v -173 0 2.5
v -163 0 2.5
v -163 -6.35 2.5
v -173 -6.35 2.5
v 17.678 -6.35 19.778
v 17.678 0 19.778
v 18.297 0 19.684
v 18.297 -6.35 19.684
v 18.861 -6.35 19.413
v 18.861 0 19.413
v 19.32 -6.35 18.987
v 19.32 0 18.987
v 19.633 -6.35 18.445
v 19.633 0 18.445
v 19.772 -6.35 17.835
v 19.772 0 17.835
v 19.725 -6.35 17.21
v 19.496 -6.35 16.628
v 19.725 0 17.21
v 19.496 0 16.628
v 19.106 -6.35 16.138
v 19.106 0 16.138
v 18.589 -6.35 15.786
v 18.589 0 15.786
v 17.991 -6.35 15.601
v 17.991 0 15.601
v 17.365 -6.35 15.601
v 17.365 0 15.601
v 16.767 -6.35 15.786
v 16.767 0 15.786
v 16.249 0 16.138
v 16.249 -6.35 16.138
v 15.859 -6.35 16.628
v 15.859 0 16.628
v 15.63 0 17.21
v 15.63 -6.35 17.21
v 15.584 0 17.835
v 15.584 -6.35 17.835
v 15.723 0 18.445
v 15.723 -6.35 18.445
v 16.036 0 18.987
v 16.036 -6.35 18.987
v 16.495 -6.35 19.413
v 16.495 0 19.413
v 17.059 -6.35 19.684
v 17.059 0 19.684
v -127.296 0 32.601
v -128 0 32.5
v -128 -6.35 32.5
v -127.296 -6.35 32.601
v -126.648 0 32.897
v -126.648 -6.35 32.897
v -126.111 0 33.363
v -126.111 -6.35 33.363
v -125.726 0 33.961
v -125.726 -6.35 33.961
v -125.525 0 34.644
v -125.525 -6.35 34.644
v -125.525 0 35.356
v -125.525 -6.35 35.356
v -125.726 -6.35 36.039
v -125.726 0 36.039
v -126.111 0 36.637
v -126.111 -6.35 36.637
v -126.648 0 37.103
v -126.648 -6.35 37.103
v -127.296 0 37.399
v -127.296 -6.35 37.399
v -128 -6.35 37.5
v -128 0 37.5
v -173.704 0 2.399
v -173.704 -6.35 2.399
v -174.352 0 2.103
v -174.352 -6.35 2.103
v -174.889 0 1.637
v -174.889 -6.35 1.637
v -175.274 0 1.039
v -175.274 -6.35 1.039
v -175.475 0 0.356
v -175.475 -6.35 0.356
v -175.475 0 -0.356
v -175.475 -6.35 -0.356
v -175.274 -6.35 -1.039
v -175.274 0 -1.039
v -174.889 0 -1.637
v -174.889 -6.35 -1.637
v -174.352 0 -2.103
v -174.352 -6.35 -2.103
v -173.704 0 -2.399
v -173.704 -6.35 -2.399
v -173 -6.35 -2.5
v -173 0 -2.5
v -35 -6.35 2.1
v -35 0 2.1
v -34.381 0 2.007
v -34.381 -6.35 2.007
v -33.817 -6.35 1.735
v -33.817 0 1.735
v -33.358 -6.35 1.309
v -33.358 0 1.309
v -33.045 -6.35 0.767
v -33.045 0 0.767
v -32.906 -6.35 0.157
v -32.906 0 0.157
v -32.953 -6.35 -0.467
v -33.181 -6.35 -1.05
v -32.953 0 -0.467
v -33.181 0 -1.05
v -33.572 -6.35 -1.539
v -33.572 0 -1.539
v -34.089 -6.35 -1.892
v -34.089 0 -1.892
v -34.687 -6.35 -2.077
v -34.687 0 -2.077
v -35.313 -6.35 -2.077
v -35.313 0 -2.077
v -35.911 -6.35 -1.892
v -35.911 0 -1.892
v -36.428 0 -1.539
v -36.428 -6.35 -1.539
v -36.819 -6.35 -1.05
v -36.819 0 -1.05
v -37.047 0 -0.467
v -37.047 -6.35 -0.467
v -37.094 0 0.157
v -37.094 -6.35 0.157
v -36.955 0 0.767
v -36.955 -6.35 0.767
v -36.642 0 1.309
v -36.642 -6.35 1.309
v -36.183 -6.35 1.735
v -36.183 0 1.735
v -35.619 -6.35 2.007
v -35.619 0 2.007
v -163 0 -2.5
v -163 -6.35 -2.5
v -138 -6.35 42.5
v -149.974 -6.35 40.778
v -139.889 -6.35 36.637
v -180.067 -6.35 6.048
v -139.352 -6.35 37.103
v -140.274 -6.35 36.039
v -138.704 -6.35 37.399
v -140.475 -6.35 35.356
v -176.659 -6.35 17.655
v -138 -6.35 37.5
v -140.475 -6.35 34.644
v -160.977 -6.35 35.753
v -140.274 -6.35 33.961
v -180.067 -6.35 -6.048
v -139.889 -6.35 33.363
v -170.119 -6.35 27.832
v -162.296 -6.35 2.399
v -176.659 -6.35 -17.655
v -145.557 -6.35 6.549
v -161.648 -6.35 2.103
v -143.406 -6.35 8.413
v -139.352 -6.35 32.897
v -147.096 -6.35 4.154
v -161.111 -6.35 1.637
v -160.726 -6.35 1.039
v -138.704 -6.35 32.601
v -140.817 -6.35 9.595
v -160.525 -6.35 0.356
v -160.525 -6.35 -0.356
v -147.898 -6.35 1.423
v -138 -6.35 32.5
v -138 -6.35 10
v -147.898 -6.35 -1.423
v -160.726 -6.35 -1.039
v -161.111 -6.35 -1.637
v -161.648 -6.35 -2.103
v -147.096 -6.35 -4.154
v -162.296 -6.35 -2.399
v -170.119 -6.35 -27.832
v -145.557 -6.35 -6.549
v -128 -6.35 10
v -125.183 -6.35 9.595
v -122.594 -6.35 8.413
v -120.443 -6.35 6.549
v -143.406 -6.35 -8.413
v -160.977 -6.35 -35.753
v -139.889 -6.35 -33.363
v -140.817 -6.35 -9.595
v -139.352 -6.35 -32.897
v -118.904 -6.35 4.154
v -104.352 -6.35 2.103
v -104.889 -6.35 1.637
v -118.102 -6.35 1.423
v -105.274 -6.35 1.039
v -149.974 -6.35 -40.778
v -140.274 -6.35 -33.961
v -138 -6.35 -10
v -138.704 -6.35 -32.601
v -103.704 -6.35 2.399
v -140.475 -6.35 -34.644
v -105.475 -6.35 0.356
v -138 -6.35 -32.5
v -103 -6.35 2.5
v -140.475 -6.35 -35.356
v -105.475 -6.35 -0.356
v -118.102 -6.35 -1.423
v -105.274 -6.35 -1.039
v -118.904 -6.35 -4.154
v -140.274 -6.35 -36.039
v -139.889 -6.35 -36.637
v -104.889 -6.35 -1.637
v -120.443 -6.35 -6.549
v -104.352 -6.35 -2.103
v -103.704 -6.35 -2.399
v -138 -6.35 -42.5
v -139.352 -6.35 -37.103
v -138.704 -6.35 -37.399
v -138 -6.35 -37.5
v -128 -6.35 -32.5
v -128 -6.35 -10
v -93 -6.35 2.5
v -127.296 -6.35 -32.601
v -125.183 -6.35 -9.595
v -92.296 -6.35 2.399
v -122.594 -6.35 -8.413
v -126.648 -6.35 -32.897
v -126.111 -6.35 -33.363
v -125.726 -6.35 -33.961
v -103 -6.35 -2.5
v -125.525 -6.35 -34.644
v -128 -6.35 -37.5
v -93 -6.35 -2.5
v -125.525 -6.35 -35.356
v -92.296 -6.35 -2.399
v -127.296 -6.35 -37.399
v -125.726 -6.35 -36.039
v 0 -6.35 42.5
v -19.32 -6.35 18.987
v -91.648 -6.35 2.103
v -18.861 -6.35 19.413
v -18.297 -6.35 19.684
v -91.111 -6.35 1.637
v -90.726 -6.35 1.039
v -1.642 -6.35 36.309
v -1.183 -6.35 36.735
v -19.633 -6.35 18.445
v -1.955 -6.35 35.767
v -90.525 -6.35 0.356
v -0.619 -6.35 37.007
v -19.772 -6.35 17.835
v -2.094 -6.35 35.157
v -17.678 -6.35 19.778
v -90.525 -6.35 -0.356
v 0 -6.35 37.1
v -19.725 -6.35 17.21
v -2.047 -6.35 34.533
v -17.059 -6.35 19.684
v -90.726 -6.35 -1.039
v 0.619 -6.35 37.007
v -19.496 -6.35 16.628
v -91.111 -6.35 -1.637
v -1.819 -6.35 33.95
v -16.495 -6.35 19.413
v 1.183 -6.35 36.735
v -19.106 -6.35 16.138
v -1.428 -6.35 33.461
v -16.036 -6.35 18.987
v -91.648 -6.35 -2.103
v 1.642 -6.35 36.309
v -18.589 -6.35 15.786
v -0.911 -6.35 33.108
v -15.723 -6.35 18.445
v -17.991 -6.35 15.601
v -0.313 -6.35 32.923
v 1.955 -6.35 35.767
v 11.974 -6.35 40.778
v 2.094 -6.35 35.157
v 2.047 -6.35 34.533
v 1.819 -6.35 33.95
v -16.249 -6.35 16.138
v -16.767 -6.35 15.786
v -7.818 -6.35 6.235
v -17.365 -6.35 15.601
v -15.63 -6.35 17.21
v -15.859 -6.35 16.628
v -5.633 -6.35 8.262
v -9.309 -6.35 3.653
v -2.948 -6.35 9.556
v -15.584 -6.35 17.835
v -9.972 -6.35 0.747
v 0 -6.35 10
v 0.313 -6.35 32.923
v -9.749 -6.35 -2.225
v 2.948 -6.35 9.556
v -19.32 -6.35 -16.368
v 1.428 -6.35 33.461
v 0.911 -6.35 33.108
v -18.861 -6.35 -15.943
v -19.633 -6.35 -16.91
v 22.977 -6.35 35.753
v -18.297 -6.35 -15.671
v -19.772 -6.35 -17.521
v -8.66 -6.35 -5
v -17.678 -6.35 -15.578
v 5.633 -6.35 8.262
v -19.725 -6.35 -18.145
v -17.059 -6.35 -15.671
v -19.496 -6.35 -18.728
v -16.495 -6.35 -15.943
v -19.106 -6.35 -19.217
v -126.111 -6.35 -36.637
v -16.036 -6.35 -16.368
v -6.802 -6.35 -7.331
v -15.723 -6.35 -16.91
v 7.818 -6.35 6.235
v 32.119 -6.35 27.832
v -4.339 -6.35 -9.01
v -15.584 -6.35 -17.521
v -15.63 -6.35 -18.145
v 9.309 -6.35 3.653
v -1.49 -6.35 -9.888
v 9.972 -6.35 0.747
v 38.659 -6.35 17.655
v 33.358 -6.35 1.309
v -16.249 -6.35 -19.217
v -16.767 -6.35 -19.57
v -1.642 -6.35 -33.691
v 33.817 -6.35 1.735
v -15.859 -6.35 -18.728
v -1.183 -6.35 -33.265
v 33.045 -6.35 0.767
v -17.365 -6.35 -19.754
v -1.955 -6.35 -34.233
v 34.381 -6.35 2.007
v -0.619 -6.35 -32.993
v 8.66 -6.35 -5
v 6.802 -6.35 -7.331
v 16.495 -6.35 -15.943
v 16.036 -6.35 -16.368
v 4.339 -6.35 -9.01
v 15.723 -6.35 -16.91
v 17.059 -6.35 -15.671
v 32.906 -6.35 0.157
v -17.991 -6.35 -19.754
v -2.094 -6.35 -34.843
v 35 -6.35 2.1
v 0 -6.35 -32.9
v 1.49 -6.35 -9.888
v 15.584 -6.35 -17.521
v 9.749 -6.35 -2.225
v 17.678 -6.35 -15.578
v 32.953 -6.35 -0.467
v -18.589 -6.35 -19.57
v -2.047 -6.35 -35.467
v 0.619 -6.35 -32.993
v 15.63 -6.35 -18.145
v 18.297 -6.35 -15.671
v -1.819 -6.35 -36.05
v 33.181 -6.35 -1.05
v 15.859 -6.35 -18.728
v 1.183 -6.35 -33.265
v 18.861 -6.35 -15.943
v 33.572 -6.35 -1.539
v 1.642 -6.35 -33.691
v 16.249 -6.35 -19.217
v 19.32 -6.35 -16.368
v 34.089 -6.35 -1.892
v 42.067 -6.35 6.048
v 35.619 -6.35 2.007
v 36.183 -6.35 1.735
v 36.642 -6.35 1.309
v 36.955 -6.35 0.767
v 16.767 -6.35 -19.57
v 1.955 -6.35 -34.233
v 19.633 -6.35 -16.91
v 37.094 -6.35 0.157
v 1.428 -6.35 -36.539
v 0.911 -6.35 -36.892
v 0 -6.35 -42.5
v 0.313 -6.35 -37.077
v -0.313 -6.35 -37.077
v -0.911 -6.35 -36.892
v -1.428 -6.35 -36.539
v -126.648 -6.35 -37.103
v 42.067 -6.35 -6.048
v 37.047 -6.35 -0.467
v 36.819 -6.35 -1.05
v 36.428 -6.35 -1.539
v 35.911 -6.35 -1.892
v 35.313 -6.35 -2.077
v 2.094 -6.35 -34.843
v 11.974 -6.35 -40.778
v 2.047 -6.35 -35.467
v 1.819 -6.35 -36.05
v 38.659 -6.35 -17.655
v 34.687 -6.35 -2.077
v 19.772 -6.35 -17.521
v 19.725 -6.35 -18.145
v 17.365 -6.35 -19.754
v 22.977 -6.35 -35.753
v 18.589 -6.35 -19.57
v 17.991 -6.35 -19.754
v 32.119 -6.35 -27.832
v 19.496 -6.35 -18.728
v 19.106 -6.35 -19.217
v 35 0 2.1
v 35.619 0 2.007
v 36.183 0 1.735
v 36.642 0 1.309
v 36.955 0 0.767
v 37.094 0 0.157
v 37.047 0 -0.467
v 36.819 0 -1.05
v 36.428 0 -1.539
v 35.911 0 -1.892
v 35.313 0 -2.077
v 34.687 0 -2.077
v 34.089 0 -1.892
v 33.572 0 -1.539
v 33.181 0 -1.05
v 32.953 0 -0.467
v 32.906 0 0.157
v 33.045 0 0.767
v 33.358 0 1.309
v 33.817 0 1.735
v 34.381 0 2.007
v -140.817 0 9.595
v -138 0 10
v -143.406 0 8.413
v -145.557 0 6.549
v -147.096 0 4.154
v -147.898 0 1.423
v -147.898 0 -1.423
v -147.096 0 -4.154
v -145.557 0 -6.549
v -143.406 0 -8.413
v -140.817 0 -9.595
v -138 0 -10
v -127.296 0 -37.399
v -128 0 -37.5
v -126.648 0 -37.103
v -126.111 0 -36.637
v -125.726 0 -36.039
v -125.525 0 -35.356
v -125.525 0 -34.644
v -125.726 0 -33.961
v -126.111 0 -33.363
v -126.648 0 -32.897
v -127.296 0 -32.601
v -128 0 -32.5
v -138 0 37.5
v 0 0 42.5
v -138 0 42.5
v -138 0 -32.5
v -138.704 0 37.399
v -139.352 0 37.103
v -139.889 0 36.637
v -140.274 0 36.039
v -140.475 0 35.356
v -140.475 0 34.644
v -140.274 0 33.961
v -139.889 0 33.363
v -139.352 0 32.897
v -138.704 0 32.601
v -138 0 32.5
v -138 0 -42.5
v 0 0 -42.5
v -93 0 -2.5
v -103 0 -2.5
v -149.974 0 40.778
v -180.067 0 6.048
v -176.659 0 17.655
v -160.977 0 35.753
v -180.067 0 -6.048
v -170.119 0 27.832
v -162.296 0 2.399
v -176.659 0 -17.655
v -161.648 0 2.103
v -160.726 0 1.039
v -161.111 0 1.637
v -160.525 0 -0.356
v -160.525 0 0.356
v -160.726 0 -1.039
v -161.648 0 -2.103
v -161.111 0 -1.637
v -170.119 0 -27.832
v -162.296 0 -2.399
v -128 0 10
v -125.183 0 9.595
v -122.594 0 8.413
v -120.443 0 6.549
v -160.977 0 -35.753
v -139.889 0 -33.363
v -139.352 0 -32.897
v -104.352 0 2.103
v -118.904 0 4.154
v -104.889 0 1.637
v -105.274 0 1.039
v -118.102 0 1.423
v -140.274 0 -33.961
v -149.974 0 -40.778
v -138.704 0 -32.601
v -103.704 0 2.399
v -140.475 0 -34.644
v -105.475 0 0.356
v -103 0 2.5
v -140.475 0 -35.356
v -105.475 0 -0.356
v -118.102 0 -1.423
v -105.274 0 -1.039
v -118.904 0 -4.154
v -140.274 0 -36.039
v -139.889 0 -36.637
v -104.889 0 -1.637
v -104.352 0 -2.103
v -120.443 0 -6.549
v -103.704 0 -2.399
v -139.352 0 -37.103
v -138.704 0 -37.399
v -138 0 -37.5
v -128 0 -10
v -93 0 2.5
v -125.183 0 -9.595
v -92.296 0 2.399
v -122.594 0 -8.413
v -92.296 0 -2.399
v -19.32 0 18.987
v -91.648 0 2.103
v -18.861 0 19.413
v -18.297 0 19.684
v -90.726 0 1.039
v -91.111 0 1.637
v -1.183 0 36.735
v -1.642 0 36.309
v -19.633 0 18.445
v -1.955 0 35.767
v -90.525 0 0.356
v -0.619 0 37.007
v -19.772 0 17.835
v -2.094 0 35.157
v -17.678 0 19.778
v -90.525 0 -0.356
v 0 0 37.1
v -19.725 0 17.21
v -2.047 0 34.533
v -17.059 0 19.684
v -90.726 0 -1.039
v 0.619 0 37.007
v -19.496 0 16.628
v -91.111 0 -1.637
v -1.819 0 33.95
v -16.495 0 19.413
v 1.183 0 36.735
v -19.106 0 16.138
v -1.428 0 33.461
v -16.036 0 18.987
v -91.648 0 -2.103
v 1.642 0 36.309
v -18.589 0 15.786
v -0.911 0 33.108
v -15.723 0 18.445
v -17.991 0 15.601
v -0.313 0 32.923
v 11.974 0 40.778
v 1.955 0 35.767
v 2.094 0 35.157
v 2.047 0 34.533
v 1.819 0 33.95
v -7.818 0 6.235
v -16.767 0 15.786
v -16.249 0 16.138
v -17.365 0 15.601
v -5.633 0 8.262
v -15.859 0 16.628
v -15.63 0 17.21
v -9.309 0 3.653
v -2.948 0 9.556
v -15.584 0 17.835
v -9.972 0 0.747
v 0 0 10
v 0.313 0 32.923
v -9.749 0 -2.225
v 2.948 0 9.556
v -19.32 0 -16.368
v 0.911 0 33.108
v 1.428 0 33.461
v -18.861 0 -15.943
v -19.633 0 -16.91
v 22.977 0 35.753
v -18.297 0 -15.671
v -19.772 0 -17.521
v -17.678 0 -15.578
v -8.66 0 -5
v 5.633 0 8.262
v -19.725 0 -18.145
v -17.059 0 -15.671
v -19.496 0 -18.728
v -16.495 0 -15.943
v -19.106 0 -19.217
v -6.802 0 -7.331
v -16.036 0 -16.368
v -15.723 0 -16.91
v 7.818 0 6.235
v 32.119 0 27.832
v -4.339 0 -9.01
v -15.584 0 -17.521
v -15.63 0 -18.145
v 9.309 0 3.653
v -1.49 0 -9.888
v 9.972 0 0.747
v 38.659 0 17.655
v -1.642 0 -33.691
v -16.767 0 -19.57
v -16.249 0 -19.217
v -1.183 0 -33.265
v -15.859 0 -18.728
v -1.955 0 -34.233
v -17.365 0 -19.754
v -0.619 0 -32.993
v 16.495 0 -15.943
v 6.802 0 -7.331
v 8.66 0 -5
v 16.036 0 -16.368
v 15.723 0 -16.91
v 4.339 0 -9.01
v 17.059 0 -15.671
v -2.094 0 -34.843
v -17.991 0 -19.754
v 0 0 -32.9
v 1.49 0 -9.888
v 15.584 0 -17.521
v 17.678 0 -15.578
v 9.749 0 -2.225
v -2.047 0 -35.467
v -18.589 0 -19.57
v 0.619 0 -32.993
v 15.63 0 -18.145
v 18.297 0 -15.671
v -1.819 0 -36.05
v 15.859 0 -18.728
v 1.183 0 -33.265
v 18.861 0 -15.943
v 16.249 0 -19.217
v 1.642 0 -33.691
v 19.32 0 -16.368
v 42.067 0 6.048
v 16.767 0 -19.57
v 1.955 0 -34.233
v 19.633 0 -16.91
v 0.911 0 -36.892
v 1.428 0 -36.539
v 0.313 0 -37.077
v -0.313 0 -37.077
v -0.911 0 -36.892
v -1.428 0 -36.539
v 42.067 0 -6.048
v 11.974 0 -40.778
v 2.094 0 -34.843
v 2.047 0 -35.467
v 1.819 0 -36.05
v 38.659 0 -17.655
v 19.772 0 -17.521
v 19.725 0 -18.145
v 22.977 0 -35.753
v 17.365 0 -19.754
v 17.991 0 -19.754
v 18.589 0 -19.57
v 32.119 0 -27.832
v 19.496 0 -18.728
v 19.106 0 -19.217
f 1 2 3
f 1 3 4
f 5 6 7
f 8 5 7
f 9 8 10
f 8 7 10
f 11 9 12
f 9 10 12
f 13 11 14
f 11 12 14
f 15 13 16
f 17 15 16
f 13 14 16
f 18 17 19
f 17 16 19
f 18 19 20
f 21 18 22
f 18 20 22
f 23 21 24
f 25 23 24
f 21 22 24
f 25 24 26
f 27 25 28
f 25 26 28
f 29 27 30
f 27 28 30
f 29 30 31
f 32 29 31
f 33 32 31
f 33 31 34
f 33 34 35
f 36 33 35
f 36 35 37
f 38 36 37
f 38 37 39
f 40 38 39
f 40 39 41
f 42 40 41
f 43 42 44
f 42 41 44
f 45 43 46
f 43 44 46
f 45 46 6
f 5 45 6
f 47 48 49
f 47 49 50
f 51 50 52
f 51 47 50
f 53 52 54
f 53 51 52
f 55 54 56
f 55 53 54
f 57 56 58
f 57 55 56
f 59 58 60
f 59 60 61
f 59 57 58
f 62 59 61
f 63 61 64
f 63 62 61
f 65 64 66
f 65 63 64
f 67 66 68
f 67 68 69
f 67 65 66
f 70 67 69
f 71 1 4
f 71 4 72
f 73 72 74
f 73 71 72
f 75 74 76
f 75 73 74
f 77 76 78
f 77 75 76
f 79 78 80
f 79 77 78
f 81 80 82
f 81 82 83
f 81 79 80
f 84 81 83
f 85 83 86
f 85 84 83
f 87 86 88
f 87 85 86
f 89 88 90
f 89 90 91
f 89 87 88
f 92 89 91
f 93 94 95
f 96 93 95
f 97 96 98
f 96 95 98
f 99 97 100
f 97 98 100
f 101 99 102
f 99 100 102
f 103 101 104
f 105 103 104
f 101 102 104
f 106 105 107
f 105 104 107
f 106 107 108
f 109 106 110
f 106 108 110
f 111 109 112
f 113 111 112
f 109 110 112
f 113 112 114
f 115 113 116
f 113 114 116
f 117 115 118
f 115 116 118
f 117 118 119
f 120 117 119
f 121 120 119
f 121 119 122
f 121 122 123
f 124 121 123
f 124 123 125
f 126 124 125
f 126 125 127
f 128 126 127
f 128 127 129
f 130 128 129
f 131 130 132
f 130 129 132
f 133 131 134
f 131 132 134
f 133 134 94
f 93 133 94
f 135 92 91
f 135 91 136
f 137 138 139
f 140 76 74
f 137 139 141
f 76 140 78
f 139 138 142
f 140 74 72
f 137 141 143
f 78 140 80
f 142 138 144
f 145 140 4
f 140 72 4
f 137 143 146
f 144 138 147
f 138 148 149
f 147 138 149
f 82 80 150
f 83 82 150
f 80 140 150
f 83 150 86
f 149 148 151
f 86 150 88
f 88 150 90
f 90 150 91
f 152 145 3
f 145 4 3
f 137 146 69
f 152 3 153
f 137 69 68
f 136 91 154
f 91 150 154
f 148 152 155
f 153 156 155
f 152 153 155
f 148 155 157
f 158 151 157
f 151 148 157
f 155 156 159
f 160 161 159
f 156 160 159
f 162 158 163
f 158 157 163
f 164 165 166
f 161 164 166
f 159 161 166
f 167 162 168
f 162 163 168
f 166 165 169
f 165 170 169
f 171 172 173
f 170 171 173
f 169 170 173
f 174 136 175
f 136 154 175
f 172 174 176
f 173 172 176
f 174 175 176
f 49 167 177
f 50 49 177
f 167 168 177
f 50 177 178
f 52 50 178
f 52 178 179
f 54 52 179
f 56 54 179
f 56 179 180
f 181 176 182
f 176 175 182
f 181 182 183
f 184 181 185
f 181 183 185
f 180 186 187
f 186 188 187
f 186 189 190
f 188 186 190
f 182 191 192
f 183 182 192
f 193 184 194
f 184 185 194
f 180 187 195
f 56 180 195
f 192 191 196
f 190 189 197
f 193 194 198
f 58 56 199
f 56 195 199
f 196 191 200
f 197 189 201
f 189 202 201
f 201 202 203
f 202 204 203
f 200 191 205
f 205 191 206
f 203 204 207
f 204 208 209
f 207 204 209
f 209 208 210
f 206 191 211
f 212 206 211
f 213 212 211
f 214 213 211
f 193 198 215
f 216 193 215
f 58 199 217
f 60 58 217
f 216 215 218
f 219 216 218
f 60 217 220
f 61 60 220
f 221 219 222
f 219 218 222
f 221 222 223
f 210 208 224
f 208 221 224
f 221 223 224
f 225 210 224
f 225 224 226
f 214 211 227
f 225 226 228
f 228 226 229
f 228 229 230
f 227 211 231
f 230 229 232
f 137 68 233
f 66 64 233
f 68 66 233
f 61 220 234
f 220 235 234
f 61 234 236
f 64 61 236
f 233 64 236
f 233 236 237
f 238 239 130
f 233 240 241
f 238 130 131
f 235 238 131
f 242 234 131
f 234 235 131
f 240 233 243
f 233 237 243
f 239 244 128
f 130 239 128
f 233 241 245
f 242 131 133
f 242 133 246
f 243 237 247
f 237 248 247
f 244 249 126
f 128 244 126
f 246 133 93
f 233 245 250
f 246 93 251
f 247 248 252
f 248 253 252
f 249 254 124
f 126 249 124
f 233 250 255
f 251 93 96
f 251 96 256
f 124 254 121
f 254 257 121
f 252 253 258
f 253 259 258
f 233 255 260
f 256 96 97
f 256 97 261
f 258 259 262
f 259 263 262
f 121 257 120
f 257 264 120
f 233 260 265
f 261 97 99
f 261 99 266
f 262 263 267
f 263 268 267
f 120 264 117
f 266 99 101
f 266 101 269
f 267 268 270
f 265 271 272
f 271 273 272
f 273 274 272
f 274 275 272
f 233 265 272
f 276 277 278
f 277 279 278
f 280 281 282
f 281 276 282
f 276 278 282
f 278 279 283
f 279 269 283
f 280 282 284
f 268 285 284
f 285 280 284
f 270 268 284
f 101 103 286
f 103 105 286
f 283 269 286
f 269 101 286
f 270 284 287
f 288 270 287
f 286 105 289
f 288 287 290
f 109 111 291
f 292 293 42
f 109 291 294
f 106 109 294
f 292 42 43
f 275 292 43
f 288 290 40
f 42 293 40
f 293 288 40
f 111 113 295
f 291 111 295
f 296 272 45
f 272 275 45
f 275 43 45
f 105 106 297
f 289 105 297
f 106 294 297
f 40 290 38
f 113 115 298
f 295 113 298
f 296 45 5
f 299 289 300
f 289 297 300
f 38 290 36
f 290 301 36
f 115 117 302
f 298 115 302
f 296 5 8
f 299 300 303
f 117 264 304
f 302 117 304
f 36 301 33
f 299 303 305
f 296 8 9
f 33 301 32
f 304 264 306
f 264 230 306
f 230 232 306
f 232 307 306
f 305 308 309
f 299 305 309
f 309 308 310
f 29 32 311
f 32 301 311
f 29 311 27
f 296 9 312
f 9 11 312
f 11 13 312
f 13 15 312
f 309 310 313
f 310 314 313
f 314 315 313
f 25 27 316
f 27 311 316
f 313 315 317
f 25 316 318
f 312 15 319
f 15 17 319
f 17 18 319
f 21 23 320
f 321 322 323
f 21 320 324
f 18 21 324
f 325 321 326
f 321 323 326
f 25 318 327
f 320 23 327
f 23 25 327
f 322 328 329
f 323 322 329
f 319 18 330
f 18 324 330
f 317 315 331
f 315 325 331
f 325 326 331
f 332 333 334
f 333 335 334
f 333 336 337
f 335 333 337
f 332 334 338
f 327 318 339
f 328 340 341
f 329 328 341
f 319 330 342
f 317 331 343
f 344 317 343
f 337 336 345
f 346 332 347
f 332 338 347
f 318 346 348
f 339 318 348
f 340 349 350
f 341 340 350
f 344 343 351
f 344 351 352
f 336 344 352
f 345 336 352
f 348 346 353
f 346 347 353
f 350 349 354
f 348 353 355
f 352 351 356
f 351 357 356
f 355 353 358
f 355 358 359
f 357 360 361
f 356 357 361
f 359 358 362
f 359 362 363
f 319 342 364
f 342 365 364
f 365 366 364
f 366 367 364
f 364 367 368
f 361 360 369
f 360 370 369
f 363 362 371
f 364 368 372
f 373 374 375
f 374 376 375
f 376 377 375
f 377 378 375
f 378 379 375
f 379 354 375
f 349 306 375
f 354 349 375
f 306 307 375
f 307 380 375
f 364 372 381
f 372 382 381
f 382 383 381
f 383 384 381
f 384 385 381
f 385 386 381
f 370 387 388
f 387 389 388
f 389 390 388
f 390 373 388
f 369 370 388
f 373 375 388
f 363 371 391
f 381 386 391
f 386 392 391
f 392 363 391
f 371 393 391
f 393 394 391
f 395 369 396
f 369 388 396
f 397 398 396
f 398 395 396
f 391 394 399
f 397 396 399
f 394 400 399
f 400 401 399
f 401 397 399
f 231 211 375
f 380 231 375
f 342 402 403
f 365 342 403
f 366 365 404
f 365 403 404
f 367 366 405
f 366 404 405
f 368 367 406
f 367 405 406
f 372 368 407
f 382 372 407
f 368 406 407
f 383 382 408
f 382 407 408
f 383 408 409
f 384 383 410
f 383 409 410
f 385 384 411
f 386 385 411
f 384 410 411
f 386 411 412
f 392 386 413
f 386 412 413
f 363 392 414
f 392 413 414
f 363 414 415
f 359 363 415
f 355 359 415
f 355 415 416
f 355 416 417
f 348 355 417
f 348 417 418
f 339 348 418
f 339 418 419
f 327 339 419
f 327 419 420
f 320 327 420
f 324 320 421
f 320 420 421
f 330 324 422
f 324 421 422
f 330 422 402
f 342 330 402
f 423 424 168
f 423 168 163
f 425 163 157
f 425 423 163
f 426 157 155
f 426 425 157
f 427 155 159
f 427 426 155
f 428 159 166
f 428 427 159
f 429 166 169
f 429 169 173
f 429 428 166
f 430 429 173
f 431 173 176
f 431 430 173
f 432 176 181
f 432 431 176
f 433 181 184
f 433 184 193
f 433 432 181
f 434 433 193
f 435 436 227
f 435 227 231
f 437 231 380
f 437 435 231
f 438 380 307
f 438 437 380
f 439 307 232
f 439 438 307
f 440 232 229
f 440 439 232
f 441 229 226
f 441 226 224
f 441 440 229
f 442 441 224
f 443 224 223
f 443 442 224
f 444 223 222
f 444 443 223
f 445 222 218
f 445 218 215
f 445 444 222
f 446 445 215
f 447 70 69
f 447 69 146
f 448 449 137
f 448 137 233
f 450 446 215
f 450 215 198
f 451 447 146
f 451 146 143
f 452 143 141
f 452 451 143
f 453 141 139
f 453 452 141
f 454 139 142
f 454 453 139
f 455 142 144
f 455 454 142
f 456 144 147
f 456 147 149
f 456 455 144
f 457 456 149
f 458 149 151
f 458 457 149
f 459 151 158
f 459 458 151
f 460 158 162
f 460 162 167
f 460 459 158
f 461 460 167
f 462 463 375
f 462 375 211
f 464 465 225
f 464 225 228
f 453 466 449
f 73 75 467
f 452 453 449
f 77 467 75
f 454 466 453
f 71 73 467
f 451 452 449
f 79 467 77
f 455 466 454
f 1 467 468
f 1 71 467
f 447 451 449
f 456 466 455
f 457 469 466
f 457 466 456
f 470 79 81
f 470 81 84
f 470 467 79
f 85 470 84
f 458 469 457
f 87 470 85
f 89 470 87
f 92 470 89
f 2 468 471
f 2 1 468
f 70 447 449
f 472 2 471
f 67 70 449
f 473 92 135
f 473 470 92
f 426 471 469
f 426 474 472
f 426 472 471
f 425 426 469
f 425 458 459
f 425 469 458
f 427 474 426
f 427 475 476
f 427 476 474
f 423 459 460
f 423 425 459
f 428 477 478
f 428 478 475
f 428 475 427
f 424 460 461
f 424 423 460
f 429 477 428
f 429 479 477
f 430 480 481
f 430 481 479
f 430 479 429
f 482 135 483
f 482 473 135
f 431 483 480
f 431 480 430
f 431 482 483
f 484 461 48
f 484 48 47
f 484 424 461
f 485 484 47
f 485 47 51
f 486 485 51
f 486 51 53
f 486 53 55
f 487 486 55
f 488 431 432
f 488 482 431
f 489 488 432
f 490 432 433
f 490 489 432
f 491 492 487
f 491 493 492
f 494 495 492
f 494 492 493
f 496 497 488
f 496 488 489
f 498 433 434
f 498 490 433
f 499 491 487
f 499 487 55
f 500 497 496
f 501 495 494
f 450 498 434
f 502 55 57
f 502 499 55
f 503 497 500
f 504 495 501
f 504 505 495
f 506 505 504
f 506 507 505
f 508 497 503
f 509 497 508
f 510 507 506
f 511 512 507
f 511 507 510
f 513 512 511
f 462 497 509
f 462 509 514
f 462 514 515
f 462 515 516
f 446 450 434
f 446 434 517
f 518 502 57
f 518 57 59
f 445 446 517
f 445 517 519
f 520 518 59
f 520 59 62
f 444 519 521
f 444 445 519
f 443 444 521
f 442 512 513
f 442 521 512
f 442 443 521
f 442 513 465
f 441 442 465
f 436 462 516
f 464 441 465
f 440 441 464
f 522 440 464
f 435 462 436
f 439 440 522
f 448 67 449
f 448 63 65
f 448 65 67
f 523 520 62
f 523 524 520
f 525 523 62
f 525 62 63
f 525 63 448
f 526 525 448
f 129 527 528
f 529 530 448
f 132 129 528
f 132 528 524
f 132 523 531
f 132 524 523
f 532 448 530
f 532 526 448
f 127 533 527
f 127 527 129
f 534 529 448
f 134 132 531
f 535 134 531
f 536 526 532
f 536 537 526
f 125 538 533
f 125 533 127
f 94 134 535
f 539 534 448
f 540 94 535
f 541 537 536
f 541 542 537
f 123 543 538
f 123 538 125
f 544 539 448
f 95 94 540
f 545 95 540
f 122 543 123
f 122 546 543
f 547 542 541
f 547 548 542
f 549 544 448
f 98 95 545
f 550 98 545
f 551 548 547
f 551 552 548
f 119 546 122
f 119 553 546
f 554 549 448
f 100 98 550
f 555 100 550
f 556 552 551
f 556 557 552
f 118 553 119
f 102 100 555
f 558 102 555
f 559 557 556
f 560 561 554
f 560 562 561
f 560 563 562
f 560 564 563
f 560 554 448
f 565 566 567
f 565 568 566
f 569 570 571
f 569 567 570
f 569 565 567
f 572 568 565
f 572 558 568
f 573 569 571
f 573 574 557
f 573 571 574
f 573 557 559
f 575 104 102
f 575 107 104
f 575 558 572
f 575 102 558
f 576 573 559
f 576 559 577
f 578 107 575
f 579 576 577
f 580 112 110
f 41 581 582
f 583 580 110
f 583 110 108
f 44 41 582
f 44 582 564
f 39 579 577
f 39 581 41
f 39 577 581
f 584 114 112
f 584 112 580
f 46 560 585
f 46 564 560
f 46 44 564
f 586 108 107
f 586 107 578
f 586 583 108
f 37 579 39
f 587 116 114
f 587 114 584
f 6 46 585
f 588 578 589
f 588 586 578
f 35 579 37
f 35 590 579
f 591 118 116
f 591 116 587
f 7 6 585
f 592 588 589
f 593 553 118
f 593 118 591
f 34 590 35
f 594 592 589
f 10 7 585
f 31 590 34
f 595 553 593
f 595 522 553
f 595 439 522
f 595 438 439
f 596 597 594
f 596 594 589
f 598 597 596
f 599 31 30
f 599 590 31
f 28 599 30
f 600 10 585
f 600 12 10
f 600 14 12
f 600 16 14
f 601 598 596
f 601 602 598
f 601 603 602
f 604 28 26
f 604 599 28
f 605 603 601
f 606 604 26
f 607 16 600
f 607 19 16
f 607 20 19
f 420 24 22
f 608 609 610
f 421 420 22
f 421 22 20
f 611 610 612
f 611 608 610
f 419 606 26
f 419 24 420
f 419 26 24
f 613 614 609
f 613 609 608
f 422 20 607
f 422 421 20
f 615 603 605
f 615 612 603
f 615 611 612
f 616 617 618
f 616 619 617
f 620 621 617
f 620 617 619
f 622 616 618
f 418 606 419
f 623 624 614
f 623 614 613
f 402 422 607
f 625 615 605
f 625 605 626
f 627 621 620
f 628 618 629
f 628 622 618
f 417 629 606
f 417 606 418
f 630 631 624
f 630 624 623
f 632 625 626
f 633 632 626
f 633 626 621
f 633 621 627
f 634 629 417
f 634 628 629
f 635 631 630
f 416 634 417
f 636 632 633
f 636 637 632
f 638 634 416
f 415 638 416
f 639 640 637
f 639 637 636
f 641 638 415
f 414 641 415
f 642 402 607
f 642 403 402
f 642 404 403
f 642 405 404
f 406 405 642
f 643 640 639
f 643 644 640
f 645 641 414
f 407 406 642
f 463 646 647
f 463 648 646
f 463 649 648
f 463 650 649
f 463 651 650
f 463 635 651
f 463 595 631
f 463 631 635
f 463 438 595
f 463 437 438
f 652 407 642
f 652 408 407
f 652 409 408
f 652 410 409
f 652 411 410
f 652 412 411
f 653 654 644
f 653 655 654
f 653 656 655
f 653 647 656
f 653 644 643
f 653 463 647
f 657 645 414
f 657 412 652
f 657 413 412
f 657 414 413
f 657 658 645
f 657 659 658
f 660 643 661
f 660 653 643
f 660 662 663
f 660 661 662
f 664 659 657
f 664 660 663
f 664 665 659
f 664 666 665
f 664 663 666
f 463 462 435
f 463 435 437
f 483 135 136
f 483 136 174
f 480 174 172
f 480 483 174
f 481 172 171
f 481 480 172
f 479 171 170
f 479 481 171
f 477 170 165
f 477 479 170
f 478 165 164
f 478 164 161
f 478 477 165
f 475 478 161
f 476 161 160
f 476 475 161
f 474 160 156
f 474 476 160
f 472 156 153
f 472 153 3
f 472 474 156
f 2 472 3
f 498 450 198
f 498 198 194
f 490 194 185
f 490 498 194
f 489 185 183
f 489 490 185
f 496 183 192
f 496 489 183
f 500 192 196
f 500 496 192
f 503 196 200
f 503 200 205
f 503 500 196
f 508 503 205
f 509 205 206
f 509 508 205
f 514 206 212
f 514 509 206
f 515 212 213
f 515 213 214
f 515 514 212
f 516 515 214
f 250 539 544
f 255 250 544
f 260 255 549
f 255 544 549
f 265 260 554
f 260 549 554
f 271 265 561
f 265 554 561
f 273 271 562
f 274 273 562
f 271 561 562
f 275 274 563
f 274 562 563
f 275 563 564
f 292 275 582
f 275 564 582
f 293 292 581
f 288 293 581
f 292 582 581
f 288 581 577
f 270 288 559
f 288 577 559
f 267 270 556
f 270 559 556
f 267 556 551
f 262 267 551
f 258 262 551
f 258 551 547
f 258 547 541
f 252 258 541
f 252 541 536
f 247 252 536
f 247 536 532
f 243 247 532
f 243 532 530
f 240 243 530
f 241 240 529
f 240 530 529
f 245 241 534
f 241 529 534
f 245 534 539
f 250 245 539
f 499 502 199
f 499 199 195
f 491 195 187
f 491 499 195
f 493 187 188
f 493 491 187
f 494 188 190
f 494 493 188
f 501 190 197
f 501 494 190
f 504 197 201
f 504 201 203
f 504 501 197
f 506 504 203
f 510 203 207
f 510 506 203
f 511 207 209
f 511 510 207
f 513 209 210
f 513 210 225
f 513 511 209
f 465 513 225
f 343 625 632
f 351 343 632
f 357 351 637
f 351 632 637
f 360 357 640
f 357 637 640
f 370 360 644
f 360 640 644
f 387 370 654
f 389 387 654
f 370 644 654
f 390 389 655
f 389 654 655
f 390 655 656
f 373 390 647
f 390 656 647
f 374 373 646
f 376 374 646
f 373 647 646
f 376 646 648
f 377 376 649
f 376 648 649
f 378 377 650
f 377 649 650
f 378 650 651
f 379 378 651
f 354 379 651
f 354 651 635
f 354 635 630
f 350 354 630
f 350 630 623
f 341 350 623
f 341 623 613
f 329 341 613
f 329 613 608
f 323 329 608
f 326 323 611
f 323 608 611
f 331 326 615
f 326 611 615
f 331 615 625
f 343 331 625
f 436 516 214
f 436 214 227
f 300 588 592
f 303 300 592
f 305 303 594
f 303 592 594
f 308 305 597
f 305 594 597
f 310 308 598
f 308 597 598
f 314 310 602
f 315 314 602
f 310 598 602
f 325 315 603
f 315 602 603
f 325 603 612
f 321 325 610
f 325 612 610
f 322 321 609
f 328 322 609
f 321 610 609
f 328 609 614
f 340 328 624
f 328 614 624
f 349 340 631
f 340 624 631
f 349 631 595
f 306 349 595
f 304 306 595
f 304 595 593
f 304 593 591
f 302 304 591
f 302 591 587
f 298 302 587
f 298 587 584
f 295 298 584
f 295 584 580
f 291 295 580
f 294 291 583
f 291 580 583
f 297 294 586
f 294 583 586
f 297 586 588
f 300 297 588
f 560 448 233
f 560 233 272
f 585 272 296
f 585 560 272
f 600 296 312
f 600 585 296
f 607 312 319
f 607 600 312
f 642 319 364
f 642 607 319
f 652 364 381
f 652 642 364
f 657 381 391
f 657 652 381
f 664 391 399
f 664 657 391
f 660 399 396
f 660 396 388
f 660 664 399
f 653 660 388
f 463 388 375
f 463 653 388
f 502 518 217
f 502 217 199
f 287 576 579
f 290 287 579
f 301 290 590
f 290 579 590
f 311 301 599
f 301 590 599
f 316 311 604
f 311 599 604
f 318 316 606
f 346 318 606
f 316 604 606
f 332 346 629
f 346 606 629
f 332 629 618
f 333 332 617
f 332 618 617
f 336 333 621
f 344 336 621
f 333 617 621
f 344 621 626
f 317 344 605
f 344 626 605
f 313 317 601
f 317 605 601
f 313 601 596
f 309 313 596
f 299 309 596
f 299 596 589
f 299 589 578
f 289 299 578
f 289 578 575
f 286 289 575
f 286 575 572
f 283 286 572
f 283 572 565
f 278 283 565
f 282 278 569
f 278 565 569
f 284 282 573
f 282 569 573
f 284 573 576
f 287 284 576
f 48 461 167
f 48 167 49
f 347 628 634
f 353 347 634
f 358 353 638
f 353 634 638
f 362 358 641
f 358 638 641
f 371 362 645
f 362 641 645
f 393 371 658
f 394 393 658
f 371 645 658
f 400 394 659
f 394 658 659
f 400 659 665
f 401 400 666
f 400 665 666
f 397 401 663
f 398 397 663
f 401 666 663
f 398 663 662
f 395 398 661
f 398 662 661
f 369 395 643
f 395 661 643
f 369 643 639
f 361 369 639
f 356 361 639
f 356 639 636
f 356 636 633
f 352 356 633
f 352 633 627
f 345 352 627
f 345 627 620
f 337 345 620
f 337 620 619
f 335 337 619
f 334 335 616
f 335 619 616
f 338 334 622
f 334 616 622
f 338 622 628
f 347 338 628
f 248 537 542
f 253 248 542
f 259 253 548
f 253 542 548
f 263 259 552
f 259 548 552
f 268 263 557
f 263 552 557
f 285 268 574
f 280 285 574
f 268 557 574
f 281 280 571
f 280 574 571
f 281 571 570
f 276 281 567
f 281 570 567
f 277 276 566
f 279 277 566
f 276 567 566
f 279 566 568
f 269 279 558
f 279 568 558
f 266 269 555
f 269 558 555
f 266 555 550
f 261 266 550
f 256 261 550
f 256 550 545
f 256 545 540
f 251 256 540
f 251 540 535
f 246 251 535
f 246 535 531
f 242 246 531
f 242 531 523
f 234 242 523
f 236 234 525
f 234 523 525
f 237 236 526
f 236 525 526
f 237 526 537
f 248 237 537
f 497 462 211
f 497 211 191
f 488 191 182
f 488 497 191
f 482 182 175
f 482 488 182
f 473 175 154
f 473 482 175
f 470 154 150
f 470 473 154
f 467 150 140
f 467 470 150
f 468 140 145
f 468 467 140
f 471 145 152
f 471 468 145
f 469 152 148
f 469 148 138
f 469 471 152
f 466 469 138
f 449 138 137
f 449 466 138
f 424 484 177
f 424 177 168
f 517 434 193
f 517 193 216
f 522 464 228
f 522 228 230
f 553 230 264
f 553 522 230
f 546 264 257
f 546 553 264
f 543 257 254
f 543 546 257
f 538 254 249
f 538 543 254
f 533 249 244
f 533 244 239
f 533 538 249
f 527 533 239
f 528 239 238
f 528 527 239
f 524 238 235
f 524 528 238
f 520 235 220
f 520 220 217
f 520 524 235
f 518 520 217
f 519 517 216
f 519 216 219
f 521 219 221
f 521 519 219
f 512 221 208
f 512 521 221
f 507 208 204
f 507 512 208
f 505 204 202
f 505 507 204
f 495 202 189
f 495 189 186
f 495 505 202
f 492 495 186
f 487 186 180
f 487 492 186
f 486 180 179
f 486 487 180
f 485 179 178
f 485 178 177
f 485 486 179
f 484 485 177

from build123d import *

# Parameters (mm, degrees)
SKETCH1_R           = 2.1
SKETCH1_R_2         = 10
BOSS_EXTRUDE1_DEPTH = 6.35


with BuildPart() as part:
    # Sketch1 → Boss-Extrude1 (new body)
    with BuildSketch(Plane(origin=(0, 0, 0), x_dir=(1, 0, 0), z_dir=(0, 1, 0))):
        with BuildLine():
            ThreePointArc((-138, 42.5), (-180.5, 0), (-138, -42.5))
            Line((-138, -42.5), (0, -42.5))
            ThreePointArc((0, -42.5), (42.5, 0), (0, 42.5))
            Line((0, 42.5), (-138, 42.5))
        make_face()
        with BuildLine():
            Line((-103, 2.5), (-93, 2.5))
            ThreePointArc((-93, 2.5), (-90.5, 0), (-93, -2.5))
            Line((-93, -2.5), (-103, -2.5))
            ThreePointArc((-103, -2.5), (-105.5, 0), (-103, 2.5))
        make_face(mode=Mode.SUBTRACT)
        with BuildLine():
            ThreePointArc((-138, -37.5), (-140.5, -35), (-138, -32.5))
            Line((-138, -32.5), (-128, -32.5))
            ThreePointArc((-128, -32.5), (-125.5, -35), (-128, -37.5))
            Line((-128, -37.5), (-138, -37.5))
        make_face(mode=Mode.SUBTRACT)
        with BuildLine():
            ThreePointArc((-173, -2.5), (-175.5, 0), (-173, 2.5))
            Line((-173, 2.5), (-163, 2.5))
            ThreePointArc((-163, 2.5), (-160.5, 0), (-163, -2.5))
            Line((-163, -2.5), (-173, -2.5))
        make_face(mode=Mode.SUBTRACT)
        with BuildLine():
            ThreePointArc((-138, -10), (-148, 0), (-138, 10))
            Line((-138, 10), (-128, 10))
            ThreePointArc((-128, 10), (-118, 0), (-128, -10))
            Line((-128, -10), (-138, -10))
        make_face(mode=Mode.SUBTRACT)
        with BuildLine():
            ThreePointArc((-138, 32.5), (-140.5, 35), (-138, 37.5))
            Line((-138, 37.5), (-128, 37.5))
            ThreePointArc((-128, 37.5), (-125.5, 35), (-128, 32.5))
            Line((-128, 32.5), (-138, 32.5))
        make_face(mode=Mode.SUBTRACT)
        with Locations(Location((0, 35, 0), (0, 0, 270))):
            Circle(SKETCH1_R, mode=Mode.SUBTRACT)
        with Locations(Location((0, -35, 0), (0, 0, 270))):
            Circle(SKETCH1_R, mode=Mode.SUBTRACT)
        with Locations(Location((-17.67766953, -17.67766953, 0), (0, 0, 270))):
            Circle(SKETCH1_R, mode=Mode.SUBTRACT)
        with Locations(Location((17.67766953, -17.67766953, 0), (0, 0, 270))):
            Circle(SKETCH1_R, mode=Mode.SUBTRACT)
        with Locations(Location((-35, 0, 0), (0, 0, 270))):
            Circle(SKETCH1_R, mode=Mode.SUBTRACT)
        with Locations(Location((-17.67766953, 17.67766953, 0), (0, 0, 270))):
            Circle(SKETCH1_R, mode=Mode.SUBTRACT)
        with Locations(Location((0, 0, 0), (0, 0, 270))):
            Circle(SKETCH1_R_2, mode=Mode.SUBTRACT)
        with Locations(Location((35, 0, 0), (0, 0, 270))):
            Circle(SKETCH1_R, mode=Mode.SUBTRACT)
        with Locations(Location((17.67766953, 17.67766953, 0), (0, 0, 270))):
            Circle(SKETCH1_R, mode=Mode.SUBTRACT)
    extrude(amount=-BOSS_EXTRUDE1_DEPTH)


solid = part.part
